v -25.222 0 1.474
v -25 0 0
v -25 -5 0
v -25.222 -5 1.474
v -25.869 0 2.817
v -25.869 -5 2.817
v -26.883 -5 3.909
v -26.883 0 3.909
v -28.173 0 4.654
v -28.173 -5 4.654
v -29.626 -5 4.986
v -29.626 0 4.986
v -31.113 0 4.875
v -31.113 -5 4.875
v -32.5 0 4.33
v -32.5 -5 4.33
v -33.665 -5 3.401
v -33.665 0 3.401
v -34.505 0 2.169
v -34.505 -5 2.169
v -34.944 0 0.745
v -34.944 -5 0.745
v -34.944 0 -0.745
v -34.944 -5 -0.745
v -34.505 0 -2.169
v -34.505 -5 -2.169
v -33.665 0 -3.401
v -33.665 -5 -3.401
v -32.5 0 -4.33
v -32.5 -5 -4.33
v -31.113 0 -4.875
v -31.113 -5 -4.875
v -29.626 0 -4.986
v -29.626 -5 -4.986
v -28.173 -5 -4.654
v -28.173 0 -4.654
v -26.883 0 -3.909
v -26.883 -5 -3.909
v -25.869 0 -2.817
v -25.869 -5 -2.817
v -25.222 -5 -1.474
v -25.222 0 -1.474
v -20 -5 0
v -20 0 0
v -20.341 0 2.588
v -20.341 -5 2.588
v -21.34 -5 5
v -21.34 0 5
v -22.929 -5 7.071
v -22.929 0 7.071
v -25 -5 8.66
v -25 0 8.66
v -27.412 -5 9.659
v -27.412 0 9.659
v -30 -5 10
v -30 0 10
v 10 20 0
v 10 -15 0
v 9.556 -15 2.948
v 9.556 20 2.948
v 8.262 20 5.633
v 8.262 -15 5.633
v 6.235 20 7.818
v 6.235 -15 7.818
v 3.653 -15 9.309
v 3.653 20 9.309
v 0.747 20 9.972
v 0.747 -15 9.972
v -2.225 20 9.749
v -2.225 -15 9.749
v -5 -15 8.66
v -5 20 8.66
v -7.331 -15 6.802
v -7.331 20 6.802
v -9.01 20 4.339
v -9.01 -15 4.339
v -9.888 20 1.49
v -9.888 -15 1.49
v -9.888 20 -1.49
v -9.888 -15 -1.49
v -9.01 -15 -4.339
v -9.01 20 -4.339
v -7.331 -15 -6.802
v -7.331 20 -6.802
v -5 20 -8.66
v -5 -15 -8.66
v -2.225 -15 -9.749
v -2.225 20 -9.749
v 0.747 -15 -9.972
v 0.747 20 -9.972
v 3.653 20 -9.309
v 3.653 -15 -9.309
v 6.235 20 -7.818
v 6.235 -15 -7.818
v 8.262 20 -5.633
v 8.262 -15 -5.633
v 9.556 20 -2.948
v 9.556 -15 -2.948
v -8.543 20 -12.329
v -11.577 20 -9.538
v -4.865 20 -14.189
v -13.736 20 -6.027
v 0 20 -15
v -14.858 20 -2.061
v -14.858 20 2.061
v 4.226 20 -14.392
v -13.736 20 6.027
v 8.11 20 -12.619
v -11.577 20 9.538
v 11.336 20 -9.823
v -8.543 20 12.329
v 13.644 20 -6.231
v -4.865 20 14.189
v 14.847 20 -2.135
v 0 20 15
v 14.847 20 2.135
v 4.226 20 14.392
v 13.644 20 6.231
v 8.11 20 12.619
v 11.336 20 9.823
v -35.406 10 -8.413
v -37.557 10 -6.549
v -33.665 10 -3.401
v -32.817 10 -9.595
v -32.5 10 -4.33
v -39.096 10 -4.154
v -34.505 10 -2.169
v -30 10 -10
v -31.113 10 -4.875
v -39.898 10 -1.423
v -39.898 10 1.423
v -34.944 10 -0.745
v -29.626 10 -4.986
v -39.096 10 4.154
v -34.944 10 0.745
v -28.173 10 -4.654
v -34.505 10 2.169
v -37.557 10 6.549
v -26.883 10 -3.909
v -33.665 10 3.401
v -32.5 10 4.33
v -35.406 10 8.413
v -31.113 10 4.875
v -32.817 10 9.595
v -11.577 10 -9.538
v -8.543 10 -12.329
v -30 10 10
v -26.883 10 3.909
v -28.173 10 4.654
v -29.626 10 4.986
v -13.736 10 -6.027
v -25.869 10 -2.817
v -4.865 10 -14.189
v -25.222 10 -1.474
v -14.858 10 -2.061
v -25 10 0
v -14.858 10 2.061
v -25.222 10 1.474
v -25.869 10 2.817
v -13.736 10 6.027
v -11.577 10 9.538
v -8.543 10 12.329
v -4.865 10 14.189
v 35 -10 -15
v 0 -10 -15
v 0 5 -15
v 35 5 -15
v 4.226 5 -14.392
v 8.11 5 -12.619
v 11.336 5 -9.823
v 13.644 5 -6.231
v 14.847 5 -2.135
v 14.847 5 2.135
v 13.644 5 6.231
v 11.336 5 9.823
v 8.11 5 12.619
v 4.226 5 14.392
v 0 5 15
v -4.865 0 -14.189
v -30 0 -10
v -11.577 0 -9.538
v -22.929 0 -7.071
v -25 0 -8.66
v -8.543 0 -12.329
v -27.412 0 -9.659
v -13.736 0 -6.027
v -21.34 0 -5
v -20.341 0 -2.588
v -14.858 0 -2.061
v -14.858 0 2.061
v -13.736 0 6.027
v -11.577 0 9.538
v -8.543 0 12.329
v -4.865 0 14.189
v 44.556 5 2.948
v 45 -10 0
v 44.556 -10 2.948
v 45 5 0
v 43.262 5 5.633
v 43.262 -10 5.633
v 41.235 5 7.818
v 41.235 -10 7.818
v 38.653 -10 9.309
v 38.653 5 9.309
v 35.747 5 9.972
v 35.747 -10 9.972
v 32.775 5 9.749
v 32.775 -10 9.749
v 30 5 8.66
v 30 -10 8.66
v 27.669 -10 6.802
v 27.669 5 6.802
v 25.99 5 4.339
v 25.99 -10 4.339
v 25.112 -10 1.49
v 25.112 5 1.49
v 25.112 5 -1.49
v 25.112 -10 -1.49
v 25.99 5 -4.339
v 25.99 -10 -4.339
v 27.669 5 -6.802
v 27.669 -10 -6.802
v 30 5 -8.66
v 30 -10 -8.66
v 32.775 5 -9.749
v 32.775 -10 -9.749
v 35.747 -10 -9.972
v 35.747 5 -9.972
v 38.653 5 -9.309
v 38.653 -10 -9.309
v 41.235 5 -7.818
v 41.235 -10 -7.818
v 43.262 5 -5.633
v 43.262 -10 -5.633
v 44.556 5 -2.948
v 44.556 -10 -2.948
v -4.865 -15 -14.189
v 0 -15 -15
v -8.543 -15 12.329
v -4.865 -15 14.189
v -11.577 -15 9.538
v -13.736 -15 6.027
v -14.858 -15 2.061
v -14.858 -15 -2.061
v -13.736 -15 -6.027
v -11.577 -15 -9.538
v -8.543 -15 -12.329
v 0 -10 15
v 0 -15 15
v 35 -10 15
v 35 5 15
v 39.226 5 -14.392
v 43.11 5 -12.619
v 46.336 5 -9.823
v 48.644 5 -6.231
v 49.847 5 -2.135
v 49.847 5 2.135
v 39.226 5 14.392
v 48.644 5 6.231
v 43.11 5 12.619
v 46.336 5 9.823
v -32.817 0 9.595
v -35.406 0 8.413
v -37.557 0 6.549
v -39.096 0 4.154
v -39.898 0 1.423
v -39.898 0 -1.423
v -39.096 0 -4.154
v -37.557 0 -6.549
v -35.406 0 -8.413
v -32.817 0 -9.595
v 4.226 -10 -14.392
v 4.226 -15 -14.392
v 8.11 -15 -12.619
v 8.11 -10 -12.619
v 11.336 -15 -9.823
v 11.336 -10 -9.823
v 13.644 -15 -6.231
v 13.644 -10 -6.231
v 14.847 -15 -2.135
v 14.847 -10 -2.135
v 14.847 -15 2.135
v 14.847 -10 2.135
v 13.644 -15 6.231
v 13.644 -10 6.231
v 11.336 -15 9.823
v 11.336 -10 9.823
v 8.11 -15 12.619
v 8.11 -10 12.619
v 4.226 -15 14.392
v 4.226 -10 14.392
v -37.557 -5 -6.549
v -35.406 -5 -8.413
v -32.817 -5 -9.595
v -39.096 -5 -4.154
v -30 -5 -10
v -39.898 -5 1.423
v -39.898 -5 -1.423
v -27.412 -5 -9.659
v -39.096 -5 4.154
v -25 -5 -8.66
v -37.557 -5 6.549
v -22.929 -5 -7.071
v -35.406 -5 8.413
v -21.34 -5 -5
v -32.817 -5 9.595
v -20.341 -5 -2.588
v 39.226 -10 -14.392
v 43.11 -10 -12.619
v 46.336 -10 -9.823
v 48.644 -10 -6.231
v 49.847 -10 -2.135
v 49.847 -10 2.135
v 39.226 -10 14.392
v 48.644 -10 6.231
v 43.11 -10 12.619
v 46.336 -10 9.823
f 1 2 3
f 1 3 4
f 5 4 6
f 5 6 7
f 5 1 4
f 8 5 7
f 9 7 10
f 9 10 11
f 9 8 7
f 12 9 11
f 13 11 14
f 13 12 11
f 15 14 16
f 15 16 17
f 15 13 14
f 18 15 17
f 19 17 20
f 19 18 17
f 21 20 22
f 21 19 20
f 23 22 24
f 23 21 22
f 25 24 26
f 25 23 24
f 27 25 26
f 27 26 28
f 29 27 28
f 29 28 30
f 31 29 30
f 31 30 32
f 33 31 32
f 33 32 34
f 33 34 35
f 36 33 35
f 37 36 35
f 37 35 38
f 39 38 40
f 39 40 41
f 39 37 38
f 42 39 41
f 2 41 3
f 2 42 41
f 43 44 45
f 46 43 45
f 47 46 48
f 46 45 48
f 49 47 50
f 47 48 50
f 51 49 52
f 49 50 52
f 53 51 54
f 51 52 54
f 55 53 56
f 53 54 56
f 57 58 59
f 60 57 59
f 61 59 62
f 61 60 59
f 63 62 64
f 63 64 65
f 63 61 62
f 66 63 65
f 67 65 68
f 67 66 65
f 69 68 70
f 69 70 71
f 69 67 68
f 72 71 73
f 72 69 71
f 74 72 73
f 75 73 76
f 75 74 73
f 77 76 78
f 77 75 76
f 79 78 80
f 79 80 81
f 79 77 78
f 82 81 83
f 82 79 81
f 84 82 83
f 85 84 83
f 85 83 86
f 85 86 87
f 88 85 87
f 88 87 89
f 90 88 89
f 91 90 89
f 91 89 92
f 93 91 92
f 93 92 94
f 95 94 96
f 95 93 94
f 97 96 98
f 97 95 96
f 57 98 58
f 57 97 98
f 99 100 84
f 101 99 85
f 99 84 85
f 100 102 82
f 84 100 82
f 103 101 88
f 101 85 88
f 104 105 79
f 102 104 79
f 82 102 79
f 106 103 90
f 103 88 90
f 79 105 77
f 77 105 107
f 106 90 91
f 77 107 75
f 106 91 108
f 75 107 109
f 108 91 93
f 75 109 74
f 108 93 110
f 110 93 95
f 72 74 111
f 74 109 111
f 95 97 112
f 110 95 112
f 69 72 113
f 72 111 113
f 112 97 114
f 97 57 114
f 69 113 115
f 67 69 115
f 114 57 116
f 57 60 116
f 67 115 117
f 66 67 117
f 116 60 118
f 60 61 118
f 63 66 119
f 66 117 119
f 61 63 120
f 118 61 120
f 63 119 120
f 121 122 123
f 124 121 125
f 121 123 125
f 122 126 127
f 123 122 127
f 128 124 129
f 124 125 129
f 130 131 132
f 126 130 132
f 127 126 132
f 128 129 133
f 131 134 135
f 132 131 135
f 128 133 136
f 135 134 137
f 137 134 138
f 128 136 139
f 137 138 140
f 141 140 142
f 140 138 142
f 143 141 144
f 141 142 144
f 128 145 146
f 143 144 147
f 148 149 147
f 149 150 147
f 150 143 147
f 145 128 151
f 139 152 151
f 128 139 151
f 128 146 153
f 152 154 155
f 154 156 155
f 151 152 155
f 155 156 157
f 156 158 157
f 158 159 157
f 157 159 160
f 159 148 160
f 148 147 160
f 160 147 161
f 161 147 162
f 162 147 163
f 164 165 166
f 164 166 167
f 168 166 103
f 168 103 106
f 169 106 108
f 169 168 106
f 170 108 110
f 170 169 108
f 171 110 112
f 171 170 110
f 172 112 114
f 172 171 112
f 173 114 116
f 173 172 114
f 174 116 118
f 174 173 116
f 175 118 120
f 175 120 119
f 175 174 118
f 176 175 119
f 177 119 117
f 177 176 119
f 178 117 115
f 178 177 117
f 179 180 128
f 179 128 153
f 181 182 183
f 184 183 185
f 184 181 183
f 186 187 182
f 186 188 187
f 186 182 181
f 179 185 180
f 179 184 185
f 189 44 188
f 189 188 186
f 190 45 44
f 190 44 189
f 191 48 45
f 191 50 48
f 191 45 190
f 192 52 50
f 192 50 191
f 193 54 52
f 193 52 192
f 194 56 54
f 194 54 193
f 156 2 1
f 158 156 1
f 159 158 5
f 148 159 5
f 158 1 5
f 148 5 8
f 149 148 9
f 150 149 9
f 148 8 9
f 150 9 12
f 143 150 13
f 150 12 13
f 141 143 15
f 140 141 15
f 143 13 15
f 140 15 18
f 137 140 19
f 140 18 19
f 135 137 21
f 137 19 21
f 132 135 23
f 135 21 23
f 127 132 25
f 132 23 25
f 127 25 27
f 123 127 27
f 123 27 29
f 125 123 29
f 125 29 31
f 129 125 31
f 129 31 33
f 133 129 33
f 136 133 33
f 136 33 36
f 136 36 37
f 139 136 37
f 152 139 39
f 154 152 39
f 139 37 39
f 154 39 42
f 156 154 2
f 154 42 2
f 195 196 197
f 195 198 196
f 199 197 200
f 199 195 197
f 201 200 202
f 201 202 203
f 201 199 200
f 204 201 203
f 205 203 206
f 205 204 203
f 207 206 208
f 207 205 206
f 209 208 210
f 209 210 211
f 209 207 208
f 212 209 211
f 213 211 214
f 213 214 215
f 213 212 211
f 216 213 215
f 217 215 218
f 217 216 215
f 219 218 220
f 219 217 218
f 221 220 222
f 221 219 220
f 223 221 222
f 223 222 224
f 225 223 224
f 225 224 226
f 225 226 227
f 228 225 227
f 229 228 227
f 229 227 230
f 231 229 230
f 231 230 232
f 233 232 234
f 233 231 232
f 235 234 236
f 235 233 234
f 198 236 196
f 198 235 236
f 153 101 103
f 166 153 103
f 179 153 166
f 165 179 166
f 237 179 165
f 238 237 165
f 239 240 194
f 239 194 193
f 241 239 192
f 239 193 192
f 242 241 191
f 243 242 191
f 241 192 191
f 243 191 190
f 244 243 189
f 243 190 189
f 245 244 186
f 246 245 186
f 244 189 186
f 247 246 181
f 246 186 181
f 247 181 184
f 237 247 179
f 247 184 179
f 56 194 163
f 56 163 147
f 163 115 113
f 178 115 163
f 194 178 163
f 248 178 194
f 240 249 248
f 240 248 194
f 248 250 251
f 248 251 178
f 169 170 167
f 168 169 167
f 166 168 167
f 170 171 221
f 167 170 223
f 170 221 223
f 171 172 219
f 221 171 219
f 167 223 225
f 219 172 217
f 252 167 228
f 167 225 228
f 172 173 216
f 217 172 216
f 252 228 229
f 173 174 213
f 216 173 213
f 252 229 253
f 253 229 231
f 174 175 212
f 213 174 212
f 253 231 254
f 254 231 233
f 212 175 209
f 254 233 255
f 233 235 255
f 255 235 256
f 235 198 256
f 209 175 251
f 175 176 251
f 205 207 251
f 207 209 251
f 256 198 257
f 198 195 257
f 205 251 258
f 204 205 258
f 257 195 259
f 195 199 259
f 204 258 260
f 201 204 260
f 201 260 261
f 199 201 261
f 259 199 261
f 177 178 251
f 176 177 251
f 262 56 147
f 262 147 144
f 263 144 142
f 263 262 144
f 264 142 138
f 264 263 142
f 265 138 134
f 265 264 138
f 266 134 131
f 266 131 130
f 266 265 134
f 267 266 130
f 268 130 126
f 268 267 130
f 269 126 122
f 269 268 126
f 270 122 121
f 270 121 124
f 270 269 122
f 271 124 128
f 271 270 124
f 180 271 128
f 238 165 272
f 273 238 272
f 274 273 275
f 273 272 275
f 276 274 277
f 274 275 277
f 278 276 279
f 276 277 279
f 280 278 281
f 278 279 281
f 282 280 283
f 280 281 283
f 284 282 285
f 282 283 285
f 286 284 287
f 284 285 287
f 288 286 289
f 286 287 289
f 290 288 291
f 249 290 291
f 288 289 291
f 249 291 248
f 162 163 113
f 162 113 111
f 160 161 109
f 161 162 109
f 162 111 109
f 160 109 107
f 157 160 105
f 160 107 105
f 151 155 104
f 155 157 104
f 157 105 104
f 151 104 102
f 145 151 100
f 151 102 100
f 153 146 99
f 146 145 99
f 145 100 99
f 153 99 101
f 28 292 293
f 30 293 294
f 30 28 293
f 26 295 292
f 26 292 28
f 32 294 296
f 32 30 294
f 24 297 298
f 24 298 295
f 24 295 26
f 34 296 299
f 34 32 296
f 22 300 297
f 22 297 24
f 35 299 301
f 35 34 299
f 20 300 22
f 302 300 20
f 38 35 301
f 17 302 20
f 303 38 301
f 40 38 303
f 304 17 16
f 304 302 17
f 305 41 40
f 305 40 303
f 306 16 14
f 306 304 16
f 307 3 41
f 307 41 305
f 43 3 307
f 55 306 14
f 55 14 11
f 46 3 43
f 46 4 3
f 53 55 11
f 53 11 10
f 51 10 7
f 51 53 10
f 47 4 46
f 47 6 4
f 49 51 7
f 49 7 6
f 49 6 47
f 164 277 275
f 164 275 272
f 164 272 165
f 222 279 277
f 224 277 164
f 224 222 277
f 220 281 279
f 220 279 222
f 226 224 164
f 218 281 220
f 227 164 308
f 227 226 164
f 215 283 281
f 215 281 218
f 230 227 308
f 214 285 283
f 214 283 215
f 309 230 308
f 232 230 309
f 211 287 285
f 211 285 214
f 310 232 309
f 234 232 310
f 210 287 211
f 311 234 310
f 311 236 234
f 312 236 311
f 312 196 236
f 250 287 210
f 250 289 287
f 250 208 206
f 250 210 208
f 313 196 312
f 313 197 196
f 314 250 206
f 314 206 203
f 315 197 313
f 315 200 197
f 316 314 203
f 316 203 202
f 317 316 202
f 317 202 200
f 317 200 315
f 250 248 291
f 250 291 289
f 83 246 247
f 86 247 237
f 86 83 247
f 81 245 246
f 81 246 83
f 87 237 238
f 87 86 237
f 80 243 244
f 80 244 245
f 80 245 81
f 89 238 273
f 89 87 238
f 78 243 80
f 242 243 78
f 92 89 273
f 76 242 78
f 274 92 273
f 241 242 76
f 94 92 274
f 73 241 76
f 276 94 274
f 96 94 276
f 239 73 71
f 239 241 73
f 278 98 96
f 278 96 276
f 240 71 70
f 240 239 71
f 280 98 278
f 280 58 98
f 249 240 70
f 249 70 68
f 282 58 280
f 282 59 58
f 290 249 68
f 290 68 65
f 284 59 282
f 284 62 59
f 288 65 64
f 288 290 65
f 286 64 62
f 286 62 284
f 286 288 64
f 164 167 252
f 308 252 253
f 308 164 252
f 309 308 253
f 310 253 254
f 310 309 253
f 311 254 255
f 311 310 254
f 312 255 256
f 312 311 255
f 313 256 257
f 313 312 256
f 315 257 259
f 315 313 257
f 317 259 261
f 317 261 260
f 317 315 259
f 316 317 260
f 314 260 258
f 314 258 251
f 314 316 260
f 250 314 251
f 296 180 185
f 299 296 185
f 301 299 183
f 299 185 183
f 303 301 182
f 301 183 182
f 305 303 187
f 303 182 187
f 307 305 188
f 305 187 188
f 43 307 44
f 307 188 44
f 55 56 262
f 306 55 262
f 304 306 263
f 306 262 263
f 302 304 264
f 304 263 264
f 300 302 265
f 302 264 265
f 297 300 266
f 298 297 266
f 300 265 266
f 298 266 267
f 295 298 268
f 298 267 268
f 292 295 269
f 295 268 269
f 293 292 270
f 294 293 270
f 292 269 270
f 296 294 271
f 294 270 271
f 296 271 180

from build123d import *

# Parameters (mm, degrees)
F0_R     = 5
F1_DEPTH = 5
F0_R_2   = 10
F2_DEPTH = 15
F3_DEPTH = 10
F4_DEPTH = 5
F5_DEPTH = 20
F6_DEPTH = 10


with BuildPart() as f1:
    # F0 (on Front) → F1 (new body)
    with BuildSketch(Plane.XZ):
        with BuildLine():
            ThreePointArc((-20, 0), (-22.9289321881, 7.0710678119), (-30, 10))
            ThreePointArc((-30, 10), (-40, 0), (-30, -10))
            ThreePointArc((-30, -10), (-22.9289321881, -7.0710678119), (-20, 0))
        make_face()
        with Locations((-30, 0)):
            Circle(F0_R, mode=Mode.SUBTRACT)
    extrude(amount=F1_DEPTH)



with BuildPart() as f2:
    # F0 (on Front) → F2 (new body)
    with BuildSketch(Plane.XZ):
        with BuildLine():
            ThreePointArc((0, -15), (10.6066017178, -10.6066017178), (15, 0))
            ThreePointArc((15, 0), (10.6066017178, 10.6066017178), (0, 15))
            Line((0, 15), (-4.8648648649, 14.1891891892))
            ThreePointArc((-4.8648648649, 14.1891891892), (-15, 0), (-4.8648648649, -14.1891891892))
            Line((-4.8648648649, -14.1891891892), (0, -15))
        make_face()
        Circle(F0_R_2, mode=Mode.SUBTRACT)
    extrude(amount=F2_DEPTH)

    # F0 (on Front) → F3 (join)
    with BuildSketch(Plane.XZ):
        with BuildLine():
            ThreePointArc((50, 0), (45.6066017178, 10.6066017178), (35, 15))
            ThreePointArc((35, 15), (20, 0), (35, -15))
            ThreePointArc((35, -15), (45.6066017178, -10.6066017178), (50, 0))
        make_face()
        with Locations((35, 0)):
            Circle(F0_R_2, mode=Mode.SUBTRACT)
        with BuildLine():
            ThreePointArc((0, 15), (10.6066017178, 10.6066017178), (15, 0))
            ThreePointArc((15, 0), (10.6066017178, -10.6066017178), (0, -15))
            Line((0, -15), (35, -15))
            ThreePointArc((35, -15), (20, 0), (35, 15))
            Line((35, 15), (0, 15))
        make_face()
    extrude(amount=F3_DEPTH)

    # F0 (on Front) → F4 (join)
    with BuildSketch(Plane.XZ):
        with BuildLine():
            ThreePointArc((50, 0), (45.6066017178, 10.6066017178), (35, 15))
            ThreePointArc((35, 15), (20, 0), (35, -15))
            ThreePointArc((35, -15), (45.6066017178, -10.6066017178), (50, 0))
        make_face()
        with Locations((35, 0)):
            Circle(F0_R_2, mode=Mode.SUBTRACT)
        with BuildLine():
            ThreePointArc((0, 15), (10.6066017178, 10.6066017178), (15, 0))
            ThreePointArc((15, 0), (10.6066017178, -10.6066017178), (0, -15))
            Line((0, -15), (35, -15))
            ThreePointArc((35, -15), (20, 0), (35, 15))
            Line((35, 15), (0, 15))
        make_face()
    extrude(amount=-F4_DEPTH)

    # F0 (on Front) → F5 (join)
    with BuildSketch(Plane.XZ):
        with BuildLine():
            ThreePointArc((0, -15), (10.6066017178, -10.6066017178), (15, 0))
            ThreePointArc((15, 0), (10.6066017178, 10.6066017178), (0, 15))
            Line((0, 15), (-4.8648648649, 14.1891891892))
            ThreePointArc((-4.8648648649, 14.1891891892), (-15, 0), (-4.8648648649, -14.1891891892))
            Line((-4.8648648649, -14.1891891892), (0, -15))
        make_face()
        Circle(F0_R_2, mode=Mode.SUBTRACT)
    extrude(amount=-F5_DEPTH)


with BuildPart() as f1_1:
    add(f1.part)

    add(f2.part)  # F6 merges F2
    # F0 (on Front) → F6 (join)
    with BuildSketch(Plane.XZ):
        with BuildLine():
            ThreePointArc((-20, 0), (-22.9289321881, 7.0710678119), (-30, 10))
            ThreePointArc((-30, 10), (-40, 0), (-30, -10))
            ThreePointArc((-30, -10), (-22.9289321881, -7.0710678119), (-20, 0))
        make_face()
        with Locations((-30, 0)):
            Circle(F0_R, mode=Mode.SUBTRACT)
        with BuildLine():
            ThreePointArc((-4.8648648649, -14.1891891892), (-15, 0), (-4.8648648649, 14.1891891892))
            Line((-4.8648648649, 14.1891891892), (-30, 10))
            ThreePointArc((-30, 10), (-22.9289321881, 7.0710678119), (-20, 0))
            ThreePointArc((-20, 0), (-22.9289321881, -7.0710678119), (-30, -10))
            Line((-30, -10), (-4.8648648649, -14.1891891892))
        make_face()
    extrude(amount=-F6_DEPTH)


solid = f1_1.part
